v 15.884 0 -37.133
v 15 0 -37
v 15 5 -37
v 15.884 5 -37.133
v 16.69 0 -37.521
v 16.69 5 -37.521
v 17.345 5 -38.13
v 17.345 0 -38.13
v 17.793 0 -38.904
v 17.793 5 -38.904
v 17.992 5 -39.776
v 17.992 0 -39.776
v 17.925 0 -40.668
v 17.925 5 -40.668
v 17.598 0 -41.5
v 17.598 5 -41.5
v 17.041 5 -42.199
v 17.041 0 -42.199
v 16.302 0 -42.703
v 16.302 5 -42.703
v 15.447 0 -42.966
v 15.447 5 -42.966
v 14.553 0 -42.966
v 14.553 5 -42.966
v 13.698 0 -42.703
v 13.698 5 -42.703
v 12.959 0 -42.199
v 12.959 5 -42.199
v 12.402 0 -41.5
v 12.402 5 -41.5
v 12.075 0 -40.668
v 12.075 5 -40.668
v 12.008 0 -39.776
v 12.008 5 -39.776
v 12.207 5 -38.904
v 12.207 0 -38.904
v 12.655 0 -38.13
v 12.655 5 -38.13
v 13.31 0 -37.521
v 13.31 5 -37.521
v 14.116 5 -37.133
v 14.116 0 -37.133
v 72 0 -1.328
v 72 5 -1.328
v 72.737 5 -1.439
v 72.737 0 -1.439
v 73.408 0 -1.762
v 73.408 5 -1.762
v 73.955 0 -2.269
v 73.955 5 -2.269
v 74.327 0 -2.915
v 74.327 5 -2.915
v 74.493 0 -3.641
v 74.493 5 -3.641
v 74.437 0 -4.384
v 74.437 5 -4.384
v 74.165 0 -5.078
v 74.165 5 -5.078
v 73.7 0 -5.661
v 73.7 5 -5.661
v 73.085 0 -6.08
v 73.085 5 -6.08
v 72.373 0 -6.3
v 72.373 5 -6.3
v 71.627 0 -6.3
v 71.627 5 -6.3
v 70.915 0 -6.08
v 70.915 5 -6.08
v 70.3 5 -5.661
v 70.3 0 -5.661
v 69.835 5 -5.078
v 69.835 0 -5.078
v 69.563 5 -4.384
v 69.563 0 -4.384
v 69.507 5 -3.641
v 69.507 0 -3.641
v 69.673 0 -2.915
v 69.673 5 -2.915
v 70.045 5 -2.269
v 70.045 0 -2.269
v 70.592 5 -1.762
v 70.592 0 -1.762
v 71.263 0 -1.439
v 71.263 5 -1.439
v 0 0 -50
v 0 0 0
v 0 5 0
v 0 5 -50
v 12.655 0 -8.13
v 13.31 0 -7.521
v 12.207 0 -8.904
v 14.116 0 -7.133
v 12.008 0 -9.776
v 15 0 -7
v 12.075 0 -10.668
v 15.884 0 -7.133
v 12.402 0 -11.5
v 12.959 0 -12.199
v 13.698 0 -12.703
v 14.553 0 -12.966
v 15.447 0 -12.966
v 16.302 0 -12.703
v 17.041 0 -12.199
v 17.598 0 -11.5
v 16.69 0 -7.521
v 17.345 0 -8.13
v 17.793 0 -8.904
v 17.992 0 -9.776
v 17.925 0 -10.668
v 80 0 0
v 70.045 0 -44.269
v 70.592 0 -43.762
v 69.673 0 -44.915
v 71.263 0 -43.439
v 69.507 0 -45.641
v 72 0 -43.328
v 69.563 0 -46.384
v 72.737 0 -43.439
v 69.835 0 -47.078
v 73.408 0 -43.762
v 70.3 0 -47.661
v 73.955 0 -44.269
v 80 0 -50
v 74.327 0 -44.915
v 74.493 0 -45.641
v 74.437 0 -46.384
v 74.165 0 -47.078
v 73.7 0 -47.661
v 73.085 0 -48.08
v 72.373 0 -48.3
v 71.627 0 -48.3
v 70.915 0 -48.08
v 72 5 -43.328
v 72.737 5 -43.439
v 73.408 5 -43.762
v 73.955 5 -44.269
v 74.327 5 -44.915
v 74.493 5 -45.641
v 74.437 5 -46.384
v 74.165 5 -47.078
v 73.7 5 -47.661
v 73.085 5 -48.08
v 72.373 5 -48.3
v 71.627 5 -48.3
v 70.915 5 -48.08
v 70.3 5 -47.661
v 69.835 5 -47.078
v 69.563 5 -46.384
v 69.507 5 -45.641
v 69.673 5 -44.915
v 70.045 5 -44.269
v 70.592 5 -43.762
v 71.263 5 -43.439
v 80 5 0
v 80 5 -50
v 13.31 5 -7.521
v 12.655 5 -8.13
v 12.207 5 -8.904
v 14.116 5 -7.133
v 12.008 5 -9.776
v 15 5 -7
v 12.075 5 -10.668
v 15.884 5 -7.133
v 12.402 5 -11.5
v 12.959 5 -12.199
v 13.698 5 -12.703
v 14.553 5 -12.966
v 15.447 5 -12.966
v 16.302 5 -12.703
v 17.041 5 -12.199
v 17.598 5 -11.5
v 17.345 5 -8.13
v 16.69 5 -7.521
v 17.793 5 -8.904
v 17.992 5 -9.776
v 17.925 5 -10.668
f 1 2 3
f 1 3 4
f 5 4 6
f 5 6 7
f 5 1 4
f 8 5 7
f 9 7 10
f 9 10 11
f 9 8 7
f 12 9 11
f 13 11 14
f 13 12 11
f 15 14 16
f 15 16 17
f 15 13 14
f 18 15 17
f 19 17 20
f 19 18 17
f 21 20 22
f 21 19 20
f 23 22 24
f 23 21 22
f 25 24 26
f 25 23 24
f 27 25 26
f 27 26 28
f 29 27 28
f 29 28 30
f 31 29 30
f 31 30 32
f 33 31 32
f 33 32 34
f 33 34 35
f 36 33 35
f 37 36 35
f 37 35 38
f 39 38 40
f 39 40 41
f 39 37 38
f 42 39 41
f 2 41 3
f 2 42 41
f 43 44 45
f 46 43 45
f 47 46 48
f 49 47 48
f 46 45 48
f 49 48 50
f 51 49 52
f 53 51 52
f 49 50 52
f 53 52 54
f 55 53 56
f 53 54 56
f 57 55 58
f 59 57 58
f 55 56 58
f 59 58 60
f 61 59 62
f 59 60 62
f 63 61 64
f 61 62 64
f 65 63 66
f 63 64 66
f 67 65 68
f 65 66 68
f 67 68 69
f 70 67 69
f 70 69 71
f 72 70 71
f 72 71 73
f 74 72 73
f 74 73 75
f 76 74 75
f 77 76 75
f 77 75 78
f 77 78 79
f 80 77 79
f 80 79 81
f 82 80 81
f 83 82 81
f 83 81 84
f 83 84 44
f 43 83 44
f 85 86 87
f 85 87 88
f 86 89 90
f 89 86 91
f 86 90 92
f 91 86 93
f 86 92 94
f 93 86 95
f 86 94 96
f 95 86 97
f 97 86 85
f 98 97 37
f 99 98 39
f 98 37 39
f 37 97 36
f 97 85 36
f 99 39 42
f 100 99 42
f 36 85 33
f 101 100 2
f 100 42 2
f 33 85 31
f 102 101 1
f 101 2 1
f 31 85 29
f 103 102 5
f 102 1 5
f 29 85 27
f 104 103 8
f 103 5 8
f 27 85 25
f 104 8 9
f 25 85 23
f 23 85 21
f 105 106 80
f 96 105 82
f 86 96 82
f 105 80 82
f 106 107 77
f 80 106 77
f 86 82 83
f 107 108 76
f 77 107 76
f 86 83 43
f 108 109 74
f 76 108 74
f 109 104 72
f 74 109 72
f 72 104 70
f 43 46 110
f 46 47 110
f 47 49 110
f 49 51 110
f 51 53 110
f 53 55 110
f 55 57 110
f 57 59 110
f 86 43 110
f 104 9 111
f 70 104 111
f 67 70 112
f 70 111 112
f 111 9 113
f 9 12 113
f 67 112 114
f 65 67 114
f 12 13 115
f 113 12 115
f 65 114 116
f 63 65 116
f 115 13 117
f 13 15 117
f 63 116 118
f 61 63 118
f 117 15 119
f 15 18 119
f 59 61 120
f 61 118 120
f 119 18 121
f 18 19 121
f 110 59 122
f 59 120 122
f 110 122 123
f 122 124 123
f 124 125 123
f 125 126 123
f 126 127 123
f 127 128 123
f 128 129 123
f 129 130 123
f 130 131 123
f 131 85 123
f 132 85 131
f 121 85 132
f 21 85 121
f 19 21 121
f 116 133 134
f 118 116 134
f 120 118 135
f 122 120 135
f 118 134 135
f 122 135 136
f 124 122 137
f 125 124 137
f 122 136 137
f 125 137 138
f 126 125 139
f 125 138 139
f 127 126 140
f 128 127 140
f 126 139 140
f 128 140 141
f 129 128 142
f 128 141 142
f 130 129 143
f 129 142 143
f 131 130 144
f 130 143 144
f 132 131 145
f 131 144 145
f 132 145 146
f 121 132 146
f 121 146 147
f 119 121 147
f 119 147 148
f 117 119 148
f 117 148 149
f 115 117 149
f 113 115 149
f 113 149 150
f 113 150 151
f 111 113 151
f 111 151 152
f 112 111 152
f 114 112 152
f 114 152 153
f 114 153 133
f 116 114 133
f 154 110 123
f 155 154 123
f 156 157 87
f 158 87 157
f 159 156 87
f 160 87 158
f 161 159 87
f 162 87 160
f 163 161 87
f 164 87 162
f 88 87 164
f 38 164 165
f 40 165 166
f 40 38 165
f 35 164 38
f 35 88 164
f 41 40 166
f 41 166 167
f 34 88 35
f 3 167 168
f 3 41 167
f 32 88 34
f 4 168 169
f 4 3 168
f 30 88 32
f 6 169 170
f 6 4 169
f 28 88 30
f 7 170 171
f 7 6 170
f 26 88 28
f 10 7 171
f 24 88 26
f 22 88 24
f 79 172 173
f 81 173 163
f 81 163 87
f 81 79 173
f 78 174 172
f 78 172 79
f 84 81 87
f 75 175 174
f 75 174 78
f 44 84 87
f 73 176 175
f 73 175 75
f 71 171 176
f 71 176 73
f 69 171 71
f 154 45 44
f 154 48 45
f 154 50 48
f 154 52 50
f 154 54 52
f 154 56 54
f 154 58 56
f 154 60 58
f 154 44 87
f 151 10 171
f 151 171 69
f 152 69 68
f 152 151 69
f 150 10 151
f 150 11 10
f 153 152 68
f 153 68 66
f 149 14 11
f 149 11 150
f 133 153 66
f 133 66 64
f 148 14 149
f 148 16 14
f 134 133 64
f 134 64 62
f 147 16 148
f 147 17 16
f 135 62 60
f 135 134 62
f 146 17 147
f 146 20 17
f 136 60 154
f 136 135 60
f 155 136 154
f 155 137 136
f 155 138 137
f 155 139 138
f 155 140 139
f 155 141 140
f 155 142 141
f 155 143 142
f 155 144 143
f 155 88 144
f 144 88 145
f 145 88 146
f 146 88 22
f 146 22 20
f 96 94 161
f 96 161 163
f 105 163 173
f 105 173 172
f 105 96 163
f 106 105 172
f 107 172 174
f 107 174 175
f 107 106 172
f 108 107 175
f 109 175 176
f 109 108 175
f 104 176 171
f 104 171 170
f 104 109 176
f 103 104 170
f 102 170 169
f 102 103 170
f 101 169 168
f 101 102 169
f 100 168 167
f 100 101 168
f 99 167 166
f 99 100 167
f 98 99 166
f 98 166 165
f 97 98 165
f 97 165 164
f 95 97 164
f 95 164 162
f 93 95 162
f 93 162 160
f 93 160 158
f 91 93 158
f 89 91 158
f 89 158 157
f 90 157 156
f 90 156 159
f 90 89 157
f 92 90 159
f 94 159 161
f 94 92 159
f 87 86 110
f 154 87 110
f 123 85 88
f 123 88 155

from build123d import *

# Parameters (mm, degrees)
SKETCH1_W           = 80
SKETCH1_H           = 50
SKETCH1_R           = 3
BOSS_EXTRUDE1_DEPTH = 5
SKETCH2_R           = 2.5
CUT_EXTRUDE1_DEPTH  = 10


with BuildPart() as part:
    # Sketch1 → Boss-Extrude1 (new body)
    with BuildSketch(Plane(origin=(0, 0, 0), x_dir=(1, 0, 0), z_dir=(0, 1, 0))):
        with Locations((40, 25)):
            Rectangle(SKETCH1_W, SKETCH1_H)
        with Locations(Location((15, 40, 0), (0, 0, 270))):
            Circle(SKETCH1_R, mode=Mode.SUBTRACT)
        with Locations(Location((15, 10, 0), (0, 0, 270))):
            Circle(SKETCH1_R, mode=Mode.SUBTRACT)
    extrude(amount=BOSS_EXTRUDE1_DEPTH)

    # Sketch2 → Cut-Extrude1 (cut)
    with BuildSketch(Plane(origin=(0, 5, 0), x_dir=(1, 0, 0), z_dir=(0, 1, 0))):
        with Locations(Location((72, 3.828026959, 0), (0, 0, 270))):
            Circle(SKETCH2_R)
        with Locations(Location((72, 45.828026959, 0), (0, 0, 270))):
            Circle(SKETCH2_R)
    extrude(amount=-CUT_EXTRUDE1_DEPTH, mode=Mode.SUBTRACT)


solid = part.part
